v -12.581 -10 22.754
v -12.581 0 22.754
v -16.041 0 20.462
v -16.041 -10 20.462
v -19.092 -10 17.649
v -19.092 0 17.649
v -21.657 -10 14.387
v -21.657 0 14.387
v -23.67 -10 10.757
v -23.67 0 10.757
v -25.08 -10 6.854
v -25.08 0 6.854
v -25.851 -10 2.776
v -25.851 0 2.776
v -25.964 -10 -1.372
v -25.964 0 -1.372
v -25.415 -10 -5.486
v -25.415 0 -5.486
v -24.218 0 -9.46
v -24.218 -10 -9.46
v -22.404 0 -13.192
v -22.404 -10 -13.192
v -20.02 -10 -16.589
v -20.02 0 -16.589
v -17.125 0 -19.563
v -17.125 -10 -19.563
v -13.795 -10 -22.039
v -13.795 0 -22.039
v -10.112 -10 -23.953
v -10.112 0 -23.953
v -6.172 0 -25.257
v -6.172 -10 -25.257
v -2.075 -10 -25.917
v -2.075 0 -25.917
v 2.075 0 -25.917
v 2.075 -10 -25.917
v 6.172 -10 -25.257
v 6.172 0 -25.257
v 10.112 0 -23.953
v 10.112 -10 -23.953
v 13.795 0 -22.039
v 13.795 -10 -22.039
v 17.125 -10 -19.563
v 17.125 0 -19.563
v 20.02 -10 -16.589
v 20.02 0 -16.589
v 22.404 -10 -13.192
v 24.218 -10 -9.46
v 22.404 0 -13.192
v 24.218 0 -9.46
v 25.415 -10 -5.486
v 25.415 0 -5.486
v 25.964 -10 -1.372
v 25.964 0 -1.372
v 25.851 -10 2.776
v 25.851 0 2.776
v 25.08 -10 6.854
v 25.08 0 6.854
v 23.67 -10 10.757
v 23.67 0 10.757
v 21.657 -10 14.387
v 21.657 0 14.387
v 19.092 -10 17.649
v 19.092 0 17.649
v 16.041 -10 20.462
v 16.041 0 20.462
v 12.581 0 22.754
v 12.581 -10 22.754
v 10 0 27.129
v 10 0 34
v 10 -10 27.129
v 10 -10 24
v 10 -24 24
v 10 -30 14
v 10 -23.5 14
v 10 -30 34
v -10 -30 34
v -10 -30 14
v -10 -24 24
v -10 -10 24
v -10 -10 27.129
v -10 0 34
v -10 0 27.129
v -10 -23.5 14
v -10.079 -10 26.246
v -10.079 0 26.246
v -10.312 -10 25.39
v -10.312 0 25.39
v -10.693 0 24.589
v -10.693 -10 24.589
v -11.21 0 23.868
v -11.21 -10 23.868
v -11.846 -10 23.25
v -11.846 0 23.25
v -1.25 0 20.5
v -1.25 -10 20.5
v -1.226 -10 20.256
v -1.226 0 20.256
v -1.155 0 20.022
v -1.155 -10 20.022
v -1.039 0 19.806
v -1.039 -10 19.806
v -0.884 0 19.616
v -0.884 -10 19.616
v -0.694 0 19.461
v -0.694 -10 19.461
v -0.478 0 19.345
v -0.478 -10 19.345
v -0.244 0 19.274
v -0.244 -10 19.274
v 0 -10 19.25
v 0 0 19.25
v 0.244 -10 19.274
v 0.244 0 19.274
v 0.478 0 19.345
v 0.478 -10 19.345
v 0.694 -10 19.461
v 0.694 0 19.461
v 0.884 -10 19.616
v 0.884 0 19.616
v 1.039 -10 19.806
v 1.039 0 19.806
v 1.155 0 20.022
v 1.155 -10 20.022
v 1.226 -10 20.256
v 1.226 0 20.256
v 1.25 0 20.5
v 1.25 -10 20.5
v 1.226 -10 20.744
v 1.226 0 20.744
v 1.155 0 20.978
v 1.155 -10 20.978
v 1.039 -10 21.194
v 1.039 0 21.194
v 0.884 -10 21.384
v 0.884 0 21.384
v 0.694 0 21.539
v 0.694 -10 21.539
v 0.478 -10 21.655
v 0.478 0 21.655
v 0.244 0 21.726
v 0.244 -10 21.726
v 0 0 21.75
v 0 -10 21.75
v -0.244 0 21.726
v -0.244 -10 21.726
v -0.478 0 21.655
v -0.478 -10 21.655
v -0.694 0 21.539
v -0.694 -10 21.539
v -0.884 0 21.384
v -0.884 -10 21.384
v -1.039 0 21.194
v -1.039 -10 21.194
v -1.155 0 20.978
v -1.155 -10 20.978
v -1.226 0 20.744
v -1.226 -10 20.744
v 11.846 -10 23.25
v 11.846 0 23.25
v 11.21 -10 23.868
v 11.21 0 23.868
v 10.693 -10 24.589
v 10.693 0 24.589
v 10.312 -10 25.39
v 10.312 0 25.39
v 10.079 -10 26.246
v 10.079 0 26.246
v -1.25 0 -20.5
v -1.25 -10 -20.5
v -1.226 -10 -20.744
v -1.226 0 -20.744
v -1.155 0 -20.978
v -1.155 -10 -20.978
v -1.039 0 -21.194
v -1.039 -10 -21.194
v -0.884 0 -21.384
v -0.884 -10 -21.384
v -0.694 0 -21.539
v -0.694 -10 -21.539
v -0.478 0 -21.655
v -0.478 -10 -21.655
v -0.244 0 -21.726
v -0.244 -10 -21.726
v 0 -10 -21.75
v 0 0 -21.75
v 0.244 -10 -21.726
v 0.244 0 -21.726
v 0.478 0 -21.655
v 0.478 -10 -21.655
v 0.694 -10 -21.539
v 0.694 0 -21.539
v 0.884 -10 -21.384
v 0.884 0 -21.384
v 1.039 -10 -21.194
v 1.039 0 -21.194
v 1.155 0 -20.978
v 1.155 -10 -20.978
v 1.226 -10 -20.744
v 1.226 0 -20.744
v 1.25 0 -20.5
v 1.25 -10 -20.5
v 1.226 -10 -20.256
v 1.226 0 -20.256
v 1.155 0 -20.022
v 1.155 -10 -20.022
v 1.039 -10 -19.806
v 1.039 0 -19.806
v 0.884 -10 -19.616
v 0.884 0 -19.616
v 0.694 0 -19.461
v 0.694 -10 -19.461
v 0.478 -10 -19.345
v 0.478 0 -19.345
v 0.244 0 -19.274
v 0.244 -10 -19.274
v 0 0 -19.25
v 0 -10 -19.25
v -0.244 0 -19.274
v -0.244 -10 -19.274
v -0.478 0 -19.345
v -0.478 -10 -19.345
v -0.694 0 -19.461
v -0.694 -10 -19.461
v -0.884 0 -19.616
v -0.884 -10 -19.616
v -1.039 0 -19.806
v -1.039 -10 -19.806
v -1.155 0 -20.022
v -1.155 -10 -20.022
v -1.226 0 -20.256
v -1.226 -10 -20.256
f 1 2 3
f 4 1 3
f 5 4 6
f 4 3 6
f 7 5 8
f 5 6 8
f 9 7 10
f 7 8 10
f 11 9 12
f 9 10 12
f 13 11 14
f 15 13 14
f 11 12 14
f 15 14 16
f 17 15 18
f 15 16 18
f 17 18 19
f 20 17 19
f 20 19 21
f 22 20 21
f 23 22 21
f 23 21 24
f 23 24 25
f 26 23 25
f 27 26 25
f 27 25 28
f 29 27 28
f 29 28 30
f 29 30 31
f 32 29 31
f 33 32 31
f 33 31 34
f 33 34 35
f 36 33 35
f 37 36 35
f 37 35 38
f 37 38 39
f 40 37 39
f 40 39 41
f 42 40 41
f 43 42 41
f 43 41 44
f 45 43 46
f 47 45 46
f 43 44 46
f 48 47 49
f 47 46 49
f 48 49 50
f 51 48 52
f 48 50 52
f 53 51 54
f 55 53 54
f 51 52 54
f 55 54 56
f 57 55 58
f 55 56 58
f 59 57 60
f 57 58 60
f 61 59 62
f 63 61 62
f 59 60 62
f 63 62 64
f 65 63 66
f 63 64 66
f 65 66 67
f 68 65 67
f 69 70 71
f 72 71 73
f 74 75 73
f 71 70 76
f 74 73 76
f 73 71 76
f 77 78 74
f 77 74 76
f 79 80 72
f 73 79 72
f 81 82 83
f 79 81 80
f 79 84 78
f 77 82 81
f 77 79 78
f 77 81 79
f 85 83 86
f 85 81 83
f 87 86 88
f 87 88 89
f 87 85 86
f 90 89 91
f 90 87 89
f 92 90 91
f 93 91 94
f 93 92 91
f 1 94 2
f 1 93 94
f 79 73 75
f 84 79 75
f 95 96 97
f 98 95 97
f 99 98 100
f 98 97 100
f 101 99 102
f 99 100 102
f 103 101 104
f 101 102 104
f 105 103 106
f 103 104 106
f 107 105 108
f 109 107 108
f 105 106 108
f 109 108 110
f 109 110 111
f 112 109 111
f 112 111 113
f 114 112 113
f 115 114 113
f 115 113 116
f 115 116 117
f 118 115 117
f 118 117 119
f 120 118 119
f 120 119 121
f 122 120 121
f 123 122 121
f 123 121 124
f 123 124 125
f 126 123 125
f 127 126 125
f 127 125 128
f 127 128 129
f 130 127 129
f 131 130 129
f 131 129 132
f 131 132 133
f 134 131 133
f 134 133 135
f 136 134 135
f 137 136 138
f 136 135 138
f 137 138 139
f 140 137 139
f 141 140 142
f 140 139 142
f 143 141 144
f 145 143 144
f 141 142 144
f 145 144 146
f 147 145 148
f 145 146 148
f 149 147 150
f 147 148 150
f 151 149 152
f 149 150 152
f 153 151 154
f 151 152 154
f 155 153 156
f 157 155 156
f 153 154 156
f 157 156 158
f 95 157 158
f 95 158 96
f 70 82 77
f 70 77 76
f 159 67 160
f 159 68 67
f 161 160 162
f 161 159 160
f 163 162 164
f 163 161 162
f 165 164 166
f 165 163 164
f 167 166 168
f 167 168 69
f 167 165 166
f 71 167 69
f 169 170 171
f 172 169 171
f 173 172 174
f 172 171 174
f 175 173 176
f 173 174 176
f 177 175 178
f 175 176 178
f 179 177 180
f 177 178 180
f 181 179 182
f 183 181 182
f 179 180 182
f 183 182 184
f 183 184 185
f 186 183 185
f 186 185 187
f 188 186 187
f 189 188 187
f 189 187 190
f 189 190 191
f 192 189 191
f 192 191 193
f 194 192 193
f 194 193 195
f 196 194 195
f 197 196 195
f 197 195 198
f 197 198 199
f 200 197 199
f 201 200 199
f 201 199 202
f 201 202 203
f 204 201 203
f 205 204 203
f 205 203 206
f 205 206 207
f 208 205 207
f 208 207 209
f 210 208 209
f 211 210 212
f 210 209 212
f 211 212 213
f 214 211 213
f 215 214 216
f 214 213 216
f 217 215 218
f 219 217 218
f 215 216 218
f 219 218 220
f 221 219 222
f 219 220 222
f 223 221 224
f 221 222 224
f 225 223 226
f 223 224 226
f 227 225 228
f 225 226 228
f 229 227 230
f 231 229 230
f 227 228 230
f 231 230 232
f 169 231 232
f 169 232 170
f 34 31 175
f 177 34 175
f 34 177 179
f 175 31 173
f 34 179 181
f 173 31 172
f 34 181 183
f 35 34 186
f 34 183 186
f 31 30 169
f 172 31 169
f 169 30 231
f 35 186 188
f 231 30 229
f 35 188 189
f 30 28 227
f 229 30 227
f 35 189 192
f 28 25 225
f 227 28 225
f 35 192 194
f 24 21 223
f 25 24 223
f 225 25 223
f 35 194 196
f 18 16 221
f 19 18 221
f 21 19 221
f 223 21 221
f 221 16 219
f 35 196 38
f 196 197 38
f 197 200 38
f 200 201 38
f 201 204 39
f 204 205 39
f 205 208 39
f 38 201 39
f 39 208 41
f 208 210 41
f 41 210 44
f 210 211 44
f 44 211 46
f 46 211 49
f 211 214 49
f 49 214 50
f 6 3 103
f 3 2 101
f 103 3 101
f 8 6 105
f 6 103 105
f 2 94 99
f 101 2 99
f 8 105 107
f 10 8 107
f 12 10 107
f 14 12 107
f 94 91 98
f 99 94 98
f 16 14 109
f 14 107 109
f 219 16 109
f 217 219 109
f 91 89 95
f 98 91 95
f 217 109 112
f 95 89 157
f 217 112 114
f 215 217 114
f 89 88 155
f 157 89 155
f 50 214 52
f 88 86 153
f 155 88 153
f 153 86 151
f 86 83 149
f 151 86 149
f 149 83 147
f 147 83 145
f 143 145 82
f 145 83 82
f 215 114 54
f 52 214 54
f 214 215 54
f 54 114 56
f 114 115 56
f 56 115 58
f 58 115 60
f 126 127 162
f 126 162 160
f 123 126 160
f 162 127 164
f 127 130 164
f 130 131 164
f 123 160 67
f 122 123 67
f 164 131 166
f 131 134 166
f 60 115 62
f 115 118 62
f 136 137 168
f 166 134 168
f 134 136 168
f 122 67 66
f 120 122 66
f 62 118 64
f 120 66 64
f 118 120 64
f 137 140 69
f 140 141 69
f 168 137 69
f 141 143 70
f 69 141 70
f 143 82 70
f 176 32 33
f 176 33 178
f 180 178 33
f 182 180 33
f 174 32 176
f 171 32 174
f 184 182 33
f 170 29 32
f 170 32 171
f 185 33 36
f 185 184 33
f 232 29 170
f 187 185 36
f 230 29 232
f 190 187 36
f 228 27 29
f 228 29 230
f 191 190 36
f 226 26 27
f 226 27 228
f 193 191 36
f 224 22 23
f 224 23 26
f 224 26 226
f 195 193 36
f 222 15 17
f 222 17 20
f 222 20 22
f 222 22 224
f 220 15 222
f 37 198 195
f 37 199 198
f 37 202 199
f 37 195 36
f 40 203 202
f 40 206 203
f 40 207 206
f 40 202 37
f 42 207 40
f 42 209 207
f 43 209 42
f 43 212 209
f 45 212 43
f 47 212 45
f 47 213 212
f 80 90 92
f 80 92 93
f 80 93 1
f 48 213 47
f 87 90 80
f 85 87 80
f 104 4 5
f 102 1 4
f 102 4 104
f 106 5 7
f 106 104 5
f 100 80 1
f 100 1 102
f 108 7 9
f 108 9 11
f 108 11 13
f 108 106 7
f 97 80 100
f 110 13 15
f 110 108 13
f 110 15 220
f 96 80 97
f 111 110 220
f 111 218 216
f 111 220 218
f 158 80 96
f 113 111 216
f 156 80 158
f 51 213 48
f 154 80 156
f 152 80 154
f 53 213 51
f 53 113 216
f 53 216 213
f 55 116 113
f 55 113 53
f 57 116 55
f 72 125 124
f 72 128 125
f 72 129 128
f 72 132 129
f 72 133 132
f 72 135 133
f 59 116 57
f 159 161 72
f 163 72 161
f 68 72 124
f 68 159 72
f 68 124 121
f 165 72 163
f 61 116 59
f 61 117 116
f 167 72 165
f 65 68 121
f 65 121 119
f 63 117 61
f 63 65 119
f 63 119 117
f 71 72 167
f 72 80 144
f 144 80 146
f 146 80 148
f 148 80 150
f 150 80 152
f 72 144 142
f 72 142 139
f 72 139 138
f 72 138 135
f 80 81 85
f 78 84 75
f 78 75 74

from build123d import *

# Parameters (mm, degrees)
F1_DEPTH = 10
F2_D     = 2.5
F3_W     = 20
F3_H     = 10
F4_DEPTH = 20
F6_DEPTH = 20
F7_R     = 5


with BuildPart() as f1:
    # F0 (on Front) → F1 (new body)
    with BuildSketch(Plane.XZ):
        with BuildLine():
            Line((-10, 34), (-10, 24))
            ThreePointArc((-10, 24), (0, -26), (10, 24))
            Line((10, 24), (10, 34))
            Line((10, 34), (-10, 34))
        make_face()
    extrude(amount=F1_DEPTH)

    # F2 (through all)
    with Locations(Plane(origin=(0, 0, 0), x_dir=(1, 0, 0), z_dir=(0, 1, 0))):
        with Locations((0, -20.5), (0, 20.5)):
            Hole(F2_D / 2)

    # F3 (on face) → F4 (join)
    with BuildSketch(Plane.XZ.offset(10)):
        with Locations((0, 29)):
            Rectangle(F3_W, F3_H)
    extrude(amount=F4_DEPTH)

    # F5 (on face) → F6 (join, through all)
    with BuildSketch(Plane(origin=(-10, 0, 0), x_dir=(0, -1, 0), z_dir=(-1, 0, 0))):
        Polygon((30, 14), (30, 24), (24, 24), (23.5, 14), align=None)
    extrude(amount=-F6_DEPTH)

    # F7
    f7_edges = [f1.edges().sort_by_distance(p)[0] for p in [
        (10, -5, 24),
        (-10, -5, 24),
    ]]
    fillet(f7_edges, radius=F7_R)


solid = f1.part
